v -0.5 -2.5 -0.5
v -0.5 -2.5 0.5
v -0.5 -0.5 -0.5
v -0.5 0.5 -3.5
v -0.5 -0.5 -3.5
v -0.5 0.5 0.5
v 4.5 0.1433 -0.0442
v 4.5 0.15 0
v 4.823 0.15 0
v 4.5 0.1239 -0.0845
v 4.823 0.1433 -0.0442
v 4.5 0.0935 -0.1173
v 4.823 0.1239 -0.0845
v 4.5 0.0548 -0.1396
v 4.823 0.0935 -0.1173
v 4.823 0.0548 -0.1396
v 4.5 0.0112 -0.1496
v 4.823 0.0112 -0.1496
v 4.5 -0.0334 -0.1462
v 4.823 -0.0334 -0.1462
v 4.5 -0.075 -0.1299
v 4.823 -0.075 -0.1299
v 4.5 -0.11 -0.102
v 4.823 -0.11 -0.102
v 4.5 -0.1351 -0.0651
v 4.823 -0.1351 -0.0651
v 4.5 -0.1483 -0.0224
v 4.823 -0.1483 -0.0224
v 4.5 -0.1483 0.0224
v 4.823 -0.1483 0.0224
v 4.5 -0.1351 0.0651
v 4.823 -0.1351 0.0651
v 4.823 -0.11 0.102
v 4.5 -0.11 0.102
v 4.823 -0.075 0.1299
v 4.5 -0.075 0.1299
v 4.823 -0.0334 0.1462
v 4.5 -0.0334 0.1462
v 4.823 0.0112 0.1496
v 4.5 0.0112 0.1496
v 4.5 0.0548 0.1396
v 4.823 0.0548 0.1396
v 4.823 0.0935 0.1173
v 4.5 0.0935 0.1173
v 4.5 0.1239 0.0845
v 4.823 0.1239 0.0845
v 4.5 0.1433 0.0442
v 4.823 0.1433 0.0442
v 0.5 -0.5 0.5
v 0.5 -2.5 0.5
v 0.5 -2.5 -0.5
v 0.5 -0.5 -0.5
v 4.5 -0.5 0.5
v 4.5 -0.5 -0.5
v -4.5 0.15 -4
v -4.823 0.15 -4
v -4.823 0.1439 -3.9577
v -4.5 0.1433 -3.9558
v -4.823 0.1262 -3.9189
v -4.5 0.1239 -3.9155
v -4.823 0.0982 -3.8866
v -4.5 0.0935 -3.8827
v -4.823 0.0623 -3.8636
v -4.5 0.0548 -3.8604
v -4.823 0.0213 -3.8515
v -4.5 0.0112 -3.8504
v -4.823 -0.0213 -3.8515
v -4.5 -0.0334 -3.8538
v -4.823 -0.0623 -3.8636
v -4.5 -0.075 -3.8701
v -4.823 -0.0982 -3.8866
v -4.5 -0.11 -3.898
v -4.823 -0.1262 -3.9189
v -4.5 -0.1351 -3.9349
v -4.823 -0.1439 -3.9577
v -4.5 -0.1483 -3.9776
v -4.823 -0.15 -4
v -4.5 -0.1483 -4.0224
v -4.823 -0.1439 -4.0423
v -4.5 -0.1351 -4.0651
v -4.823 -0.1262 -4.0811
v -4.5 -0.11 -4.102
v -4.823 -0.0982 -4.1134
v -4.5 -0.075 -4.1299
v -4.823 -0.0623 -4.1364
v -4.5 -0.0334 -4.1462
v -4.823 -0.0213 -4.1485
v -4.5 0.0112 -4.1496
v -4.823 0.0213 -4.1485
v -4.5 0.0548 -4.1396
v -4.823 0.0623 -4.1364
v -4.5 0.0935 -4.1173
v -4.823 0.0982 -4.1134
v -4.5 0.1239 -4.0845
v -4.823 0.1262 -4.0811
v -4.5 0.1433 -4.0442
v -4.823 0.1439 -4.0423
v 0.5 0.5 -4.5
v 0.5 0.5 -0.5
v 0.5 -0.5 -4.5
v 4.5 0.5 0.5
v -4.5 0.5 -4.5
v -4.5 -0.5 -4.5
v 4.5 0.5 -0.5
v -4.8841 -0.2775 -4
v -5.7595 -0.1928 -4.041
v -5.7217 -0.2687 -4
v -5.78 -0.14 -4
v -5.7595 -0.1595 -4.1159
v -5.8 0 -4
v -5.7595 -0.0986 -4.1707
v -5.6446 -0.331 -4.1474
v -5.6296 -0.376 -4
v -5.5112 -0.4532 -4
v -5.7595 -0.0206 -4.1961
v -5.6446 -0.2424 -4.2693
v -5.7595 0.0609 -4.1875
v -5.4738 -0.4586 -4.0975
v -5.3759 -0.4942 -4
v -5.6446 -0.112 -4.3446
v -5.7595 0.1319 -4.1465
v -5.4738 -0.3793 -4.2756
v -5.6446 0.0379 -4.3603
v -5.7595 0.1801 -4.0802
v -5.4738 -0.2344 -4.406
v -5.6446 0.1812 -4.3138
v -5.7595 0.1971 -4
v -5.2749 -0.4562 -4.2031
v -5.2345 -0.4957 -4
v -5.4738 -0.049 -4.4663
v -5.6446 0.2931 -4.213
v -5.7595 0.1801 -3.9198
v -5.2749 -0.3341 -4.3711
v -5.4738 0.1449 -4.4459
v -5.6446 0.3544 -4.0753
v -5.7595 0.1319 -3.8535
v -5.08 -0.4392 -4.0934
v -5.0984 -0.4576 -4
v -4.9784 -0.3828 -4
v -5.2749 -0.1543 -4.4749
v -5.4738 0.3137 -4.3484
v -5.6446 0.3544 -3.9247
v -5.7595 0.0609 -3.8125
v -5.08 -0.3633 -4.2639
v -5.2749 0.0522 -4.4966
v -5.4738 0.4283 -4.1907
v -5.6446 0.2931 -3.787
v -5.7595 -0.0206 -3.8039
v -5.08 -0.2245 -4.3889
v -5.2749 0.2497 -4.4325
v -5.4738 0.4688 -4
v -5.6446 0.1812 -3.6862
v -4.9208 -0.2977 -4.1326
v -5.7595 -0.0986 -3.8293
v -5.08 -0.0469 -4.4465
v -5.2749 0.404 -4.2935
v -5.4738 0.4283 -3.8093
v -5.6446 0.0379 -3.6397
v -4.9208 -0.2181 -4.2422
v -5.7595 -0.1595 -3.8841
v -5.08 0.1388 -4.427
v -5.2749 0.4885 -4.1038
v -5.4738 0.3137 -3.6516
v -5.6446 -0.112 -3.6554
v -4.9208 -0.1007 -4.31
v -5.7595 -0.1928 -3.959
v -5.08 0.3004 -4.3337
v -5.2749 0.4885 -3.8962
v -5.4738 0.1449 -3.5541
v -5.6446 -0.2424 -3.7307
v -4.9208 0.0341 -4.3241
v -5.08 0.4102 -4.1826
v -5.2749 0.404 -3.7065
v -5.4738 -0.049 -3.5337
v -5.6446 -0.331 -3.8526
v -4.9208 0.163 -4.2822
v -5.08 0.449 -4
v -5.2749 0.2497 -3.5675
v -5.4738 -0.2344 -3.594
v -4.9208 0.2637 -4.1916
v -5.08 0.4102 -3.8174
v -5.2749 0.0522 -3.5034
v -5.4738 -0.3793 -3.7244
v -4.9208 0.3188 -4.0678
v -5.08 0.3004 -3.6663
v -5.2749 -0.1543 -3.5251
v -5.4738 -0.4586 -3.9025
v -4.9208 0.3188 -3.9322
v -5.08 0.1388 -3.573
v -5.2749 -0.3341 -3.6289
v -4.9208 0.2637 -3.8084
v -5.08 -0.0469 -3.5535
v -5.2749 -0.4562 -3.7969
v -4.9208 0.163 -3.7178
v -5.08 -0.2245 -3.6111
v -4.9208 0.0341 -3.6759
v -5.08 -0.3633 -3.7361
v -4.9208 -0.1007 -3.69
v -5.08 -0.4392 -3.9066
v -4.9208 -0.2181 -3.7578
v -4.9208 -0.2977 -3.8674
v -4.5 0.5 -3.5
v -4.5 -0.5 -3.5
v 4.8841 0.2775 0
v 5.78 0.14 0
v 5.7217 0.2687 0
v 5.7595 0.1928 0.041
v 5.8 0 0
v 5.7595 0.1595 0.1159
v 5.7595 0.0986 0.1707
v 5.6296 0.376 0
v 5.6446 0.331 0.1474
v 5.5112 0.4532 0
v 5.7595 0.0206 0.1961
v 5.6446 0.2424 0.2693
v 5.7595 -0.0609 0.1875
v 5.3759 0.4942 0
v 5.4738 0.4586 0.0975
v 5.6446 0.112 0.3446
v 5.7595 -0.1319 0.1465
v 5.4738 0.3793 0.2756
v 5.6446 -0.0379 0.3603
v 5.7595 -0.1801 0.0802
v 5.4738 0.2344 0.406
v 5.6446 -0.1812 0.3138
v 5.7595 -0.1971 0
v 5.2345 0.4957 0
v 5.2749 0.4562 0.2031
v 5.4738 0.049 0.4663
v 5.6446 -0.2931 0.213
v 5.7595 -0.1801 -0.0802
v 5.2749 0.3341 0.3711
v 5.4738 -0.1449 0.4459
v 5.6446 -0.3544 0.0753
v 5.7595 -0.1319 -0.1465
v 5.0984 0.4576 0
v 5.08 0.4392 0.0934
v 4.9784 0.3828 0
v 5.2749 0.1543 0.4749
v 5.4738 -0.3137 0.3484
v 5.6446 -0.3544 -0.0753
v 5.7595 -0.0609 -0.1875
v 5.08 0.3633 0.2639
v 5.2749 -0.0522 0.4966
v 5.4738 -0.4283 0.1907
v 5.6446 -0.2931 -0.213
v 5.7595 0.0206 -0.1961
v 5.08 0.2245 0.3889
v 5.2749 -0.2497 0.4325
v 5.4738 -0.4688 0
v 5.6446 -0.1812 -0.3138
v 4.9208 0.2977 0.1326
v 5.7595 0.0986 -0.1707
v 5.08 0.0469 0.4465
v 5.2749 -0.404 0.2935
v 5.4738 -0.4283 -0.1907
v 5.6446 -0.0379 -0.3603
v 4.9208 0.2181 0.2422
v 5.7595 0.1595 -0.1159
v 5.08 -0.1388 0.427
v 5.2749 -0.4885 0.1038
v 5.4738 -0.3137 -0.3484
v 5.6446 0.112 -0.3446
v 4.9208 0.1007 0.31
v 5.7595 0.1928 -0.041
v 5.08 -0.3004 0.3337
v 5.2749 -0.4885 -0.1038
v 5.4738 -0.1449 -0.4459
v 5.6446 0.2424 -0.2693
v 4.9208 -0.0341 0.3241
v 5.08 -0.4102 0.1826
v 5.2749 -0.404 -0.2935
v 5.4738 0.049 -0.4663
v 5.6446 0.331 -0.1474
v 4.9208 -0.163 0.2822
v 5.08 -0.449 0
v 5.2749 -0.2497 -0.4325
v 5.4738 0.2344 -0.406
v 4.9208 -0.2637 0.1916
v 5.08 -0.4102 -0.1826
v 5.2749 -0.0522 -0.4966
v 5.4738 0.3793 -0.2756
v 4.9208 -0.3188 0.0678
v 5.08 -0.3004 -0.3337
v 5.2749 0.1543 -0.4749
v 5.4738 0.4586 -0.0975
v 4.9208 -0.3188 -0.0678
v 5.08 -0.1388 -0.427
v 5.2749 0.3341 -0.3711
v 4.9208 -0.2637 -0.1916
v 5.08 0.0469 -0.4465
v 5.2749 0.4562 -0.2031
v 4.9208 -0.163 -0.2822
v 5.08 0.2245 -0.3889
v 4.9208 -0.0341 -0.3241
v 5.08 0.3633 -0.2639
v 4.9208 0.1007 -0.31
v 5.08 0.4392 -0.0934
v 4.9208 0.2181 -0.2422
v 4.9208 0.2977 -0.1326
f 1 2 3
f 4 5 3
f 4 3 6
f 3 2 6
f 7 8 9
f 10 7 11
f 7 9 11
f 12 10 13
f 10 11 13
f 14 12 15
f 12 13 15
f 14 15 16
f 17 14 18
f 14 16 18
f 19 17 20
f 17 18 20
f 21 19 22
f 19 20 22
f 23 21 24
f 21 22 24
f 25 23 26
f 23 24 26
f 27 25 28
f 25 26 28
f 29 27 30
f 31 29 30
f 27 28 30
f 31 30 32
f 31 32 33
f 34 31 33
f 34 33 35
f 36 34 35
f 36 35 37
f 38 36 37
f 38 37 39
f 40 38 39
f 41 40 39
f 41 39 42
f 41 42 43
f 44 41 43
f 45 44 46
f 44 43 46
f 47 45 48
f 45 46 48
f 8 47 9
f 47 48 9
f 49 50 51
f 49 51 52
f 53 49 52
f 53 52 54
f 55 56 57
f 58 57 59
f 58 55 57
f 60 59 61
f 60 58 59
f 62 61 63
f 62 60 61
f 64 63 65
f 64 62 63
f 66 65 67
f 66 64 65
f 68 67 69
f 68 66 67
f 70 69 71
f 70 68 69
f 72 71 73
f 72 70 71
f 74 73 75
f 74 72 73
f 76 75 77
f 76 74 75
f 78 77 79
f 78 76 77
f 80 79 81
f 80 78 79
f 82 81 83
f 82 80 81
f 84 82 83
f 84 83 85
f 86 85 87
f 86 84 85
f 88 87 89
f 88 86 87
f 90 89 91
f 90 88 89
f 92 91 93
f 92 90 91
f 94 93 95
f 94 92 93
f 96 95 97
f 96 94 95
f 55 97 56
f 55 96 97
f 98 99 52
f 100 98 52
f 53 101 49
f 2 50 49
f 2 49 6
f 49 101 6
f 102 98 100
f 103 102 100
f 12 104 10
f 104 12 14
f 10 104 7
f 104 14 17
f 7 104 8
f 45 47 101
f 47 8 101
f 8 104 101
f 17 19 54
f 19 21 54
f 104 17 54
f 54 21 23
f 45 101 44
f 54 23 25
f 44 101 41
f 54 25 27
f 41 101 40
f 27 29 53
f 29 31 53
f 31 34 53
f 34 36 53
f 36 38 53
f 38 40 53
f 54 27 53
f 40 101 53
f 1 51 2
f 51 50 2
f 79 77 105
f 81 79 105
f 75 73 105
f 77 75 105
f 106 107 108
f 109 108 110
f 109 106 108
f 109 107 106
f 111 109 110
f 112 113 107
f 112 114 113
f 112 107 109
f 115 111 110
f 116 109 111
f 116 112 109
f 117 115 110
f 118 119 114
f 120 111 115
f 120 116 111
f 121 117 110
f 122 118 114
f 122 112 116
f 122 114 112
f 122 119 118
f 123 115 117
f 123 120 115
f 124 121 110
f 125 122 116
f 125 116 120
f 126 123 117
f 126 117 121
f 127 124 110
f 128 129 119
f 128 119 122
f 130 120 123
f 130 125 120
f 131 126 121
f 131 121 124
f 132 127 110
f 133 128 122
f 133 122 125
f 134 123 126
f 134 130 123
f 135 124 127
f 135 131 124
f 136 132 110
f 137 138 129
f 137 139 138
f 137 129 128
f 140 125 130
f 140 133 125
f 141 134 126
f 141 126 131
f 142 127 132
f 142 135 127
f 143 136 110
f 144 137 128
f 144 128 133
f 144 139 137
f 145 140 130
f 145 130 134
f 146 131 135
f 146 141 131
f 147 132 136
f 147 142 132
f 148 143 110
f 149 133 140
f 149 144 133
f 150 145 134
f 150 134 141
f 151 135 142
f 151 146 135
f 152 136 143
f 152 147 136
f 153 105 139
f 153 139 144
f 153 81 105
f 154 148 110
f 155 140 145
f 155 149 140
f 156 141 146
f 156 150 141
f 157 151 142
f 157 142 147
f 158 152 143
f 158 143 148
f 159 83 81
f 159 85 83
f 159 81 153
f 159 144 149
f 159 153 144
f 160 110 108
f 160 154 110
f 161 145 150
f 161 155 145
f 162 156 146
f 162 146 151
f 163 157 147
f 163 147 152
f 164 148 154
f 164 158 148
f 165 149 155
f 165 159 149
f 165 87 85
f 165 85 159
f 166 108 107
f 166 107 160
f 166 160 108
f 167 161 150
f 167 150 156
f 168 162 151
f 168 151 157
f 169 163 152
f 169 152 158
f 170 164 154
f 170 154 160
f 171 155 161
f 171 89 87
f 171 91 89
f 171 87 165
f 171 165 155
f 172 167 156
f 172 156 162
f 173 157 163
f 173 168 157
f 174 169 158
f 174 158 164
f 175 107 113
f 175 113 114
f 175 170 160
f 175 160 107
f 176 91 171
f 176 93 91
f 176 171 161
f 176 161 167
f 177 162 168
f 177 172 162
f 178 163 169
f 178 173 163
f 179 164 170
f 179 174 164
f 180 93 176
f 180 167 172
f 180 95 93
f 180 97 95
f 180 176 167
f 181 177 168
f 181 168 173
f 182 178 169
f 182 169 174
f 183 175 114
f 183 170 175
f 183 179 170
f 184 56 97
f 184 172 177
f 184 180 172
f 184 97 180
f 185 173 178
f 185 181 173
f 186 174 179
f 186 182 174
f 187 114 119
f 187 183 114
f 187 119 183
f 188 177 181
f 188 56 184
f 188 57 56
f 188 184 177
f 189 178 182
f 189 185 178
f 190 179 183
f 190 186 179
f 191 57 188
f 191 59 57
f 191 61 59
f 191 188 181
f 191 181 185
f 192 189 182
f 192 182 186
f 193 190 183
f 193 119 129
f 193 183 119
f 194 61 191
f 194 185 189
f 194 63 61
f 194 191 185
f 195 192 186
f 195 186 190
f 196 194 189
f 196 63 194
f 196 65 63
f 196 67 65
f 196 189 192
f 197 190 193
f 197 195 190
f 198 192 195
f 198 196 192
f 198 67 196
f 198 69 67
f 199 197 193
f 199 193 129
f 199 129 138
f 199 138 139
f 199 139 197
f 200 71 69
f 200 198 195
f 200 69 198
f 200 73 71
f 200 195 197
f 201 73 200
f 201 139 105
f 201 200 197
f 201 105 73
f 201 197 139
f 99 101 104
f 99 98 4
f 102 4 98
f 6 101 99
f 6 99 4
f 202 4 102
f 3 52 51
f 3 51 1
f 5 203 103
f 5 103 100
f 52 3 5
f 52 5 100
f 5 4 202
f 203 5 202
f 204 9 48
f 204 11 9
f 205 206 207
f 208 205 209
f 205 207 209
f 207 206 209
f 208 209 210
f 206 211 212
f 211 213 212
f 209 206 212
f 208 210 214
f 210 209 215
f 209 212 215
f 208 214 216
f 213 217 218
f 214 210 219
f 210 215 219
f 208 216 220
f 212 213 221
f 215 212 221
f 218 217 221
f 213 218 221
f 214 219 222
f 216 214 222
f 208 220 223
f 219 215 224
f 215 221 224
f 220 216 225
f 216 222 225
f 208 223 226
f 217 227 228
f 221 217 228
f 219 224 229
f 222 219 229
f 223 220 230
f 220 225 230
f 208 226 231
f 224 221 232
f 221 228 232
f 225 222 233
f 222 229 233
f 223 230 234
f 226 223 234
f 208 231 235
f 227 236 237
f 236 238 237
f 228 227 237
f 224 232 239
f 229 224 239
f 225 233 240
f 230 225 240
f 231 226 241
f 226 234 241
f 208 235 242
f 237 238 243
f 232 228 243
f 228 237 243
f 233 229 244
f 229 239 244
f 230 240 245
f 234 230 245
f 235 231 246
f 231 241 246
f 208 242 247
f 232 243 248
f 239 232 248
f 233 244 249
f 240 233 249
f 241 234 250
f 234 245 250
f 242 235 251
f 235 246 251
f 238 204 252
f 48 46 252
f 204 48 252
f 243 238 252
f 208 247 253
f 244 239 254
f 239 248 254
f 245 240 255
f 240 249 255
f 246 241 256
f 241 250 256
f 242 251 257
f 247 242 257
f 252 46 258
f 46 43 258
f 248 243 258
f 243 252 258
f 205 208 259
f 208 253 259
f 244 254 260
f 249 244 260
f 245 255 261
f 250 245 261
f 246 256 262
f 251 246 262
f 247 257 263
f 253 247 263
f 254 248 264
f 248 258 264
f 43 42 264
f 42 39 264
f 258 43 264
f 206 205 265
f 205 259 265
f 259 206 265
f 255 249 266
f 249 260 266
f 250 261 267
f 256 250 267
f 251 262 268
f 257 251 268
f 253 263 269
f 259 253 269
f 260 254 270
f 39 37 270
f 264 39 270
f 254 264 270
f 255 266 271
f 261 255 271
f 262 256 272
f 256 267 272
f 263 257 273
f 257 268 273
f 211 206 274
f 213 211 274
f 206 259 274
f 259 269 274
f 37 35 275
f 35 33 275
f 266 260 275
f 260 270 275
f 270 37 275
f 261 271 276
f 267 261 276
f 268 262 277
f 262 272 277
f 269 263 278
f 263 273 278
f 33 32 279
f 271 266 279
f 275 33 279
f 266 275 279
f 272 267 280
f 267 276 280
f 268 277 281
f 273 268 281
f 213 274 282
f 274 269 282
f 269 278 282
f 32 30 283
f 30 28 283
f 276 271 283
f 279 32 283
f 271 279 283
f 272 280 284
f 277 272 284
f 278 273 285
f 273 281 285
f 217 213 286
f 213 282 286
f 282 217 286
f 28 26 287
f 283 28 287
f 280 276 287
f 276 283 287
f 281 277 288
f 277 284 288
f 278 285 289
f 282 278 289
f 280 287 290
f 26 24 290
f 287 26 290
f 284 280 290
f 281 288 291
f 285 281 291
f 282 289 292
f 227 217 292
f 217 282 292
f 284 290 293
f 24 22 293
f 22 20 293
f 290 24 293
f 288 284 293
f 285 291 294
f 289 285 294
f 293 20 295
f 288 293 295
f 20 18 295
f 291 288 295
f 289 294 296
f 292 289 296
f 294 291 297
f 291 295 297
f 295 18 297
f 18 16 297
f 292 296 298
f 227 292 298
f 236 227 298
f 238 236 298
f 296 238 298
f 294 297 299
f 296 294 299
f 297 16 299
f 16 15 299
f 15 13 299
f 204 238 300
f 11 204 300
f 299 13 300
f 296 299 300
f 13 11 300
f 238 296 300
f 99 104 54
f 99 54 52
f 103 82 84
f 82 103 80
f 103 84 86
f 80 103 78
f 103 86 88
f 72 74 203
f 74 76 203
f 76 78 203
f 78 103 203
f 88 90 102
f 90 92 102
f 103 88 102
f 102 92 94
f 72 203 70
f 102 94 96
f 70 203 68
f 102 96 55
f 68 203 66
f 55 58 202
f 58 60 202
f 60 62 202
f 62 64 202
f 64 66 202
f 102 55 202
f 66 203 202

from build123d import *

# Parameters (mm, degrees)
PAD_DEPTH    = 0.5
PAD001_DEPTH = 0.5
PAD002_DEPTH = 0.5
PAD003_DEPTH = 0.5
SKETCH004_W  = 0.8
SKETCH004_H  = 0.15
SKETCH006_W  = 0.8
SKETCH006_H  = 0.15


with BuildPart() as part:
    # Sketch → Pad (new body, symmetric)
    with BuildSketch(Plane.XY):
        Polygon((0.5, 0.5), (4.5, 0.5), (4.5, -0.5), (0.5, -0.5), (-0.5, -0.5), (-0.5, 0.5), align=None)
    extrude(amount=PAD_DEPTH, both=True)

    # Sketch001 → Pad001 (join, symmetric)
    with BuildSketch(Plane.YZ):
        Polygon((-0.5, 0.5), (0.5, 0.5), (0.5, -0.5), (0.5, -4.5), (-0.5, -4.5), (-0.5, -0.5), align=None)
    extrude(amount=PAD001_DEPTH, both=True)

    # Sketch002 (on DatumPlane) → Pad002 (join, symmetric)
    with BuildSketch(Plane.XY.offset(-4)):
        Polygon((-4.5, 0.5), (-0.5, 0.5), (0.5, 0.5), (0.5, -0.5), (-0.5, -0.5), (-4.5, -0.5), align=None)
    extrude(amount=PAD002_DEPTH, both=True)

    # Sketch003 → Pad003 (join, symmetric)
    with BuildSketch(Plane.XY):
        Polygon((-0.5, 0.5), (0.5, 0.5), (0.5, -0.5), (0.5, -2.5), (-0.5, -2.5), (-0.5, -0.5), align=None)
    extrude(amount=PAD003_DEPTH, both=True)

    # Sketch004 → Revolution (revolve)
    with BuildSketch(Plane.XY):
        with Locations((4.9, 0.075)):
            Rectangle(SKETCH004_W, SKETCH004_H)
    revolve(axis=Axis((0, 0, 0), (-1, 0, 0)))

    # Sketch005 → Revolution001 (revolve)
    with BuildSketch(Plane.XY):
        with BuildLine():
            ThreePointArc((5.8, 0), (5.3, 0.5), (4.8, 0))
            Line((4.8, 0), (5.3, 0))
            Line((5.3, 0), (5.8, 0))
        make_face()
    revolve(axis=Axis((0, 0, 0), (1, 0, 0)))

    # Sketch006 (on DatumPlane) → Revolution002 (revolve)
    with BuildSketch(Plane.XY.offset(-4)):
        with Locations((-4.9, 0.075)):
            Rectangle(SKETCH006_W, SKETCH006_H)
    revolve(axis=Axis((0, 0, -4), (1, 0, 0)))

    # Sketch007 (on DatumPlane) → Revolution003 (revolve)
    with BuildSketch(Plane.XY.offset(-4)):
        with BuildLine():
            ThreePointArc((-5.8, 0), (-5.3, -0.5), (-4.8, 0))
            Line((-5.3, 0), (-4.8, 0))
            Line((-5.8, 0), (-5.3, 0))
        make_face()
    revolve(axis=Axis((0, 0, -4), (1, 0, 0)))


solid = part.part
